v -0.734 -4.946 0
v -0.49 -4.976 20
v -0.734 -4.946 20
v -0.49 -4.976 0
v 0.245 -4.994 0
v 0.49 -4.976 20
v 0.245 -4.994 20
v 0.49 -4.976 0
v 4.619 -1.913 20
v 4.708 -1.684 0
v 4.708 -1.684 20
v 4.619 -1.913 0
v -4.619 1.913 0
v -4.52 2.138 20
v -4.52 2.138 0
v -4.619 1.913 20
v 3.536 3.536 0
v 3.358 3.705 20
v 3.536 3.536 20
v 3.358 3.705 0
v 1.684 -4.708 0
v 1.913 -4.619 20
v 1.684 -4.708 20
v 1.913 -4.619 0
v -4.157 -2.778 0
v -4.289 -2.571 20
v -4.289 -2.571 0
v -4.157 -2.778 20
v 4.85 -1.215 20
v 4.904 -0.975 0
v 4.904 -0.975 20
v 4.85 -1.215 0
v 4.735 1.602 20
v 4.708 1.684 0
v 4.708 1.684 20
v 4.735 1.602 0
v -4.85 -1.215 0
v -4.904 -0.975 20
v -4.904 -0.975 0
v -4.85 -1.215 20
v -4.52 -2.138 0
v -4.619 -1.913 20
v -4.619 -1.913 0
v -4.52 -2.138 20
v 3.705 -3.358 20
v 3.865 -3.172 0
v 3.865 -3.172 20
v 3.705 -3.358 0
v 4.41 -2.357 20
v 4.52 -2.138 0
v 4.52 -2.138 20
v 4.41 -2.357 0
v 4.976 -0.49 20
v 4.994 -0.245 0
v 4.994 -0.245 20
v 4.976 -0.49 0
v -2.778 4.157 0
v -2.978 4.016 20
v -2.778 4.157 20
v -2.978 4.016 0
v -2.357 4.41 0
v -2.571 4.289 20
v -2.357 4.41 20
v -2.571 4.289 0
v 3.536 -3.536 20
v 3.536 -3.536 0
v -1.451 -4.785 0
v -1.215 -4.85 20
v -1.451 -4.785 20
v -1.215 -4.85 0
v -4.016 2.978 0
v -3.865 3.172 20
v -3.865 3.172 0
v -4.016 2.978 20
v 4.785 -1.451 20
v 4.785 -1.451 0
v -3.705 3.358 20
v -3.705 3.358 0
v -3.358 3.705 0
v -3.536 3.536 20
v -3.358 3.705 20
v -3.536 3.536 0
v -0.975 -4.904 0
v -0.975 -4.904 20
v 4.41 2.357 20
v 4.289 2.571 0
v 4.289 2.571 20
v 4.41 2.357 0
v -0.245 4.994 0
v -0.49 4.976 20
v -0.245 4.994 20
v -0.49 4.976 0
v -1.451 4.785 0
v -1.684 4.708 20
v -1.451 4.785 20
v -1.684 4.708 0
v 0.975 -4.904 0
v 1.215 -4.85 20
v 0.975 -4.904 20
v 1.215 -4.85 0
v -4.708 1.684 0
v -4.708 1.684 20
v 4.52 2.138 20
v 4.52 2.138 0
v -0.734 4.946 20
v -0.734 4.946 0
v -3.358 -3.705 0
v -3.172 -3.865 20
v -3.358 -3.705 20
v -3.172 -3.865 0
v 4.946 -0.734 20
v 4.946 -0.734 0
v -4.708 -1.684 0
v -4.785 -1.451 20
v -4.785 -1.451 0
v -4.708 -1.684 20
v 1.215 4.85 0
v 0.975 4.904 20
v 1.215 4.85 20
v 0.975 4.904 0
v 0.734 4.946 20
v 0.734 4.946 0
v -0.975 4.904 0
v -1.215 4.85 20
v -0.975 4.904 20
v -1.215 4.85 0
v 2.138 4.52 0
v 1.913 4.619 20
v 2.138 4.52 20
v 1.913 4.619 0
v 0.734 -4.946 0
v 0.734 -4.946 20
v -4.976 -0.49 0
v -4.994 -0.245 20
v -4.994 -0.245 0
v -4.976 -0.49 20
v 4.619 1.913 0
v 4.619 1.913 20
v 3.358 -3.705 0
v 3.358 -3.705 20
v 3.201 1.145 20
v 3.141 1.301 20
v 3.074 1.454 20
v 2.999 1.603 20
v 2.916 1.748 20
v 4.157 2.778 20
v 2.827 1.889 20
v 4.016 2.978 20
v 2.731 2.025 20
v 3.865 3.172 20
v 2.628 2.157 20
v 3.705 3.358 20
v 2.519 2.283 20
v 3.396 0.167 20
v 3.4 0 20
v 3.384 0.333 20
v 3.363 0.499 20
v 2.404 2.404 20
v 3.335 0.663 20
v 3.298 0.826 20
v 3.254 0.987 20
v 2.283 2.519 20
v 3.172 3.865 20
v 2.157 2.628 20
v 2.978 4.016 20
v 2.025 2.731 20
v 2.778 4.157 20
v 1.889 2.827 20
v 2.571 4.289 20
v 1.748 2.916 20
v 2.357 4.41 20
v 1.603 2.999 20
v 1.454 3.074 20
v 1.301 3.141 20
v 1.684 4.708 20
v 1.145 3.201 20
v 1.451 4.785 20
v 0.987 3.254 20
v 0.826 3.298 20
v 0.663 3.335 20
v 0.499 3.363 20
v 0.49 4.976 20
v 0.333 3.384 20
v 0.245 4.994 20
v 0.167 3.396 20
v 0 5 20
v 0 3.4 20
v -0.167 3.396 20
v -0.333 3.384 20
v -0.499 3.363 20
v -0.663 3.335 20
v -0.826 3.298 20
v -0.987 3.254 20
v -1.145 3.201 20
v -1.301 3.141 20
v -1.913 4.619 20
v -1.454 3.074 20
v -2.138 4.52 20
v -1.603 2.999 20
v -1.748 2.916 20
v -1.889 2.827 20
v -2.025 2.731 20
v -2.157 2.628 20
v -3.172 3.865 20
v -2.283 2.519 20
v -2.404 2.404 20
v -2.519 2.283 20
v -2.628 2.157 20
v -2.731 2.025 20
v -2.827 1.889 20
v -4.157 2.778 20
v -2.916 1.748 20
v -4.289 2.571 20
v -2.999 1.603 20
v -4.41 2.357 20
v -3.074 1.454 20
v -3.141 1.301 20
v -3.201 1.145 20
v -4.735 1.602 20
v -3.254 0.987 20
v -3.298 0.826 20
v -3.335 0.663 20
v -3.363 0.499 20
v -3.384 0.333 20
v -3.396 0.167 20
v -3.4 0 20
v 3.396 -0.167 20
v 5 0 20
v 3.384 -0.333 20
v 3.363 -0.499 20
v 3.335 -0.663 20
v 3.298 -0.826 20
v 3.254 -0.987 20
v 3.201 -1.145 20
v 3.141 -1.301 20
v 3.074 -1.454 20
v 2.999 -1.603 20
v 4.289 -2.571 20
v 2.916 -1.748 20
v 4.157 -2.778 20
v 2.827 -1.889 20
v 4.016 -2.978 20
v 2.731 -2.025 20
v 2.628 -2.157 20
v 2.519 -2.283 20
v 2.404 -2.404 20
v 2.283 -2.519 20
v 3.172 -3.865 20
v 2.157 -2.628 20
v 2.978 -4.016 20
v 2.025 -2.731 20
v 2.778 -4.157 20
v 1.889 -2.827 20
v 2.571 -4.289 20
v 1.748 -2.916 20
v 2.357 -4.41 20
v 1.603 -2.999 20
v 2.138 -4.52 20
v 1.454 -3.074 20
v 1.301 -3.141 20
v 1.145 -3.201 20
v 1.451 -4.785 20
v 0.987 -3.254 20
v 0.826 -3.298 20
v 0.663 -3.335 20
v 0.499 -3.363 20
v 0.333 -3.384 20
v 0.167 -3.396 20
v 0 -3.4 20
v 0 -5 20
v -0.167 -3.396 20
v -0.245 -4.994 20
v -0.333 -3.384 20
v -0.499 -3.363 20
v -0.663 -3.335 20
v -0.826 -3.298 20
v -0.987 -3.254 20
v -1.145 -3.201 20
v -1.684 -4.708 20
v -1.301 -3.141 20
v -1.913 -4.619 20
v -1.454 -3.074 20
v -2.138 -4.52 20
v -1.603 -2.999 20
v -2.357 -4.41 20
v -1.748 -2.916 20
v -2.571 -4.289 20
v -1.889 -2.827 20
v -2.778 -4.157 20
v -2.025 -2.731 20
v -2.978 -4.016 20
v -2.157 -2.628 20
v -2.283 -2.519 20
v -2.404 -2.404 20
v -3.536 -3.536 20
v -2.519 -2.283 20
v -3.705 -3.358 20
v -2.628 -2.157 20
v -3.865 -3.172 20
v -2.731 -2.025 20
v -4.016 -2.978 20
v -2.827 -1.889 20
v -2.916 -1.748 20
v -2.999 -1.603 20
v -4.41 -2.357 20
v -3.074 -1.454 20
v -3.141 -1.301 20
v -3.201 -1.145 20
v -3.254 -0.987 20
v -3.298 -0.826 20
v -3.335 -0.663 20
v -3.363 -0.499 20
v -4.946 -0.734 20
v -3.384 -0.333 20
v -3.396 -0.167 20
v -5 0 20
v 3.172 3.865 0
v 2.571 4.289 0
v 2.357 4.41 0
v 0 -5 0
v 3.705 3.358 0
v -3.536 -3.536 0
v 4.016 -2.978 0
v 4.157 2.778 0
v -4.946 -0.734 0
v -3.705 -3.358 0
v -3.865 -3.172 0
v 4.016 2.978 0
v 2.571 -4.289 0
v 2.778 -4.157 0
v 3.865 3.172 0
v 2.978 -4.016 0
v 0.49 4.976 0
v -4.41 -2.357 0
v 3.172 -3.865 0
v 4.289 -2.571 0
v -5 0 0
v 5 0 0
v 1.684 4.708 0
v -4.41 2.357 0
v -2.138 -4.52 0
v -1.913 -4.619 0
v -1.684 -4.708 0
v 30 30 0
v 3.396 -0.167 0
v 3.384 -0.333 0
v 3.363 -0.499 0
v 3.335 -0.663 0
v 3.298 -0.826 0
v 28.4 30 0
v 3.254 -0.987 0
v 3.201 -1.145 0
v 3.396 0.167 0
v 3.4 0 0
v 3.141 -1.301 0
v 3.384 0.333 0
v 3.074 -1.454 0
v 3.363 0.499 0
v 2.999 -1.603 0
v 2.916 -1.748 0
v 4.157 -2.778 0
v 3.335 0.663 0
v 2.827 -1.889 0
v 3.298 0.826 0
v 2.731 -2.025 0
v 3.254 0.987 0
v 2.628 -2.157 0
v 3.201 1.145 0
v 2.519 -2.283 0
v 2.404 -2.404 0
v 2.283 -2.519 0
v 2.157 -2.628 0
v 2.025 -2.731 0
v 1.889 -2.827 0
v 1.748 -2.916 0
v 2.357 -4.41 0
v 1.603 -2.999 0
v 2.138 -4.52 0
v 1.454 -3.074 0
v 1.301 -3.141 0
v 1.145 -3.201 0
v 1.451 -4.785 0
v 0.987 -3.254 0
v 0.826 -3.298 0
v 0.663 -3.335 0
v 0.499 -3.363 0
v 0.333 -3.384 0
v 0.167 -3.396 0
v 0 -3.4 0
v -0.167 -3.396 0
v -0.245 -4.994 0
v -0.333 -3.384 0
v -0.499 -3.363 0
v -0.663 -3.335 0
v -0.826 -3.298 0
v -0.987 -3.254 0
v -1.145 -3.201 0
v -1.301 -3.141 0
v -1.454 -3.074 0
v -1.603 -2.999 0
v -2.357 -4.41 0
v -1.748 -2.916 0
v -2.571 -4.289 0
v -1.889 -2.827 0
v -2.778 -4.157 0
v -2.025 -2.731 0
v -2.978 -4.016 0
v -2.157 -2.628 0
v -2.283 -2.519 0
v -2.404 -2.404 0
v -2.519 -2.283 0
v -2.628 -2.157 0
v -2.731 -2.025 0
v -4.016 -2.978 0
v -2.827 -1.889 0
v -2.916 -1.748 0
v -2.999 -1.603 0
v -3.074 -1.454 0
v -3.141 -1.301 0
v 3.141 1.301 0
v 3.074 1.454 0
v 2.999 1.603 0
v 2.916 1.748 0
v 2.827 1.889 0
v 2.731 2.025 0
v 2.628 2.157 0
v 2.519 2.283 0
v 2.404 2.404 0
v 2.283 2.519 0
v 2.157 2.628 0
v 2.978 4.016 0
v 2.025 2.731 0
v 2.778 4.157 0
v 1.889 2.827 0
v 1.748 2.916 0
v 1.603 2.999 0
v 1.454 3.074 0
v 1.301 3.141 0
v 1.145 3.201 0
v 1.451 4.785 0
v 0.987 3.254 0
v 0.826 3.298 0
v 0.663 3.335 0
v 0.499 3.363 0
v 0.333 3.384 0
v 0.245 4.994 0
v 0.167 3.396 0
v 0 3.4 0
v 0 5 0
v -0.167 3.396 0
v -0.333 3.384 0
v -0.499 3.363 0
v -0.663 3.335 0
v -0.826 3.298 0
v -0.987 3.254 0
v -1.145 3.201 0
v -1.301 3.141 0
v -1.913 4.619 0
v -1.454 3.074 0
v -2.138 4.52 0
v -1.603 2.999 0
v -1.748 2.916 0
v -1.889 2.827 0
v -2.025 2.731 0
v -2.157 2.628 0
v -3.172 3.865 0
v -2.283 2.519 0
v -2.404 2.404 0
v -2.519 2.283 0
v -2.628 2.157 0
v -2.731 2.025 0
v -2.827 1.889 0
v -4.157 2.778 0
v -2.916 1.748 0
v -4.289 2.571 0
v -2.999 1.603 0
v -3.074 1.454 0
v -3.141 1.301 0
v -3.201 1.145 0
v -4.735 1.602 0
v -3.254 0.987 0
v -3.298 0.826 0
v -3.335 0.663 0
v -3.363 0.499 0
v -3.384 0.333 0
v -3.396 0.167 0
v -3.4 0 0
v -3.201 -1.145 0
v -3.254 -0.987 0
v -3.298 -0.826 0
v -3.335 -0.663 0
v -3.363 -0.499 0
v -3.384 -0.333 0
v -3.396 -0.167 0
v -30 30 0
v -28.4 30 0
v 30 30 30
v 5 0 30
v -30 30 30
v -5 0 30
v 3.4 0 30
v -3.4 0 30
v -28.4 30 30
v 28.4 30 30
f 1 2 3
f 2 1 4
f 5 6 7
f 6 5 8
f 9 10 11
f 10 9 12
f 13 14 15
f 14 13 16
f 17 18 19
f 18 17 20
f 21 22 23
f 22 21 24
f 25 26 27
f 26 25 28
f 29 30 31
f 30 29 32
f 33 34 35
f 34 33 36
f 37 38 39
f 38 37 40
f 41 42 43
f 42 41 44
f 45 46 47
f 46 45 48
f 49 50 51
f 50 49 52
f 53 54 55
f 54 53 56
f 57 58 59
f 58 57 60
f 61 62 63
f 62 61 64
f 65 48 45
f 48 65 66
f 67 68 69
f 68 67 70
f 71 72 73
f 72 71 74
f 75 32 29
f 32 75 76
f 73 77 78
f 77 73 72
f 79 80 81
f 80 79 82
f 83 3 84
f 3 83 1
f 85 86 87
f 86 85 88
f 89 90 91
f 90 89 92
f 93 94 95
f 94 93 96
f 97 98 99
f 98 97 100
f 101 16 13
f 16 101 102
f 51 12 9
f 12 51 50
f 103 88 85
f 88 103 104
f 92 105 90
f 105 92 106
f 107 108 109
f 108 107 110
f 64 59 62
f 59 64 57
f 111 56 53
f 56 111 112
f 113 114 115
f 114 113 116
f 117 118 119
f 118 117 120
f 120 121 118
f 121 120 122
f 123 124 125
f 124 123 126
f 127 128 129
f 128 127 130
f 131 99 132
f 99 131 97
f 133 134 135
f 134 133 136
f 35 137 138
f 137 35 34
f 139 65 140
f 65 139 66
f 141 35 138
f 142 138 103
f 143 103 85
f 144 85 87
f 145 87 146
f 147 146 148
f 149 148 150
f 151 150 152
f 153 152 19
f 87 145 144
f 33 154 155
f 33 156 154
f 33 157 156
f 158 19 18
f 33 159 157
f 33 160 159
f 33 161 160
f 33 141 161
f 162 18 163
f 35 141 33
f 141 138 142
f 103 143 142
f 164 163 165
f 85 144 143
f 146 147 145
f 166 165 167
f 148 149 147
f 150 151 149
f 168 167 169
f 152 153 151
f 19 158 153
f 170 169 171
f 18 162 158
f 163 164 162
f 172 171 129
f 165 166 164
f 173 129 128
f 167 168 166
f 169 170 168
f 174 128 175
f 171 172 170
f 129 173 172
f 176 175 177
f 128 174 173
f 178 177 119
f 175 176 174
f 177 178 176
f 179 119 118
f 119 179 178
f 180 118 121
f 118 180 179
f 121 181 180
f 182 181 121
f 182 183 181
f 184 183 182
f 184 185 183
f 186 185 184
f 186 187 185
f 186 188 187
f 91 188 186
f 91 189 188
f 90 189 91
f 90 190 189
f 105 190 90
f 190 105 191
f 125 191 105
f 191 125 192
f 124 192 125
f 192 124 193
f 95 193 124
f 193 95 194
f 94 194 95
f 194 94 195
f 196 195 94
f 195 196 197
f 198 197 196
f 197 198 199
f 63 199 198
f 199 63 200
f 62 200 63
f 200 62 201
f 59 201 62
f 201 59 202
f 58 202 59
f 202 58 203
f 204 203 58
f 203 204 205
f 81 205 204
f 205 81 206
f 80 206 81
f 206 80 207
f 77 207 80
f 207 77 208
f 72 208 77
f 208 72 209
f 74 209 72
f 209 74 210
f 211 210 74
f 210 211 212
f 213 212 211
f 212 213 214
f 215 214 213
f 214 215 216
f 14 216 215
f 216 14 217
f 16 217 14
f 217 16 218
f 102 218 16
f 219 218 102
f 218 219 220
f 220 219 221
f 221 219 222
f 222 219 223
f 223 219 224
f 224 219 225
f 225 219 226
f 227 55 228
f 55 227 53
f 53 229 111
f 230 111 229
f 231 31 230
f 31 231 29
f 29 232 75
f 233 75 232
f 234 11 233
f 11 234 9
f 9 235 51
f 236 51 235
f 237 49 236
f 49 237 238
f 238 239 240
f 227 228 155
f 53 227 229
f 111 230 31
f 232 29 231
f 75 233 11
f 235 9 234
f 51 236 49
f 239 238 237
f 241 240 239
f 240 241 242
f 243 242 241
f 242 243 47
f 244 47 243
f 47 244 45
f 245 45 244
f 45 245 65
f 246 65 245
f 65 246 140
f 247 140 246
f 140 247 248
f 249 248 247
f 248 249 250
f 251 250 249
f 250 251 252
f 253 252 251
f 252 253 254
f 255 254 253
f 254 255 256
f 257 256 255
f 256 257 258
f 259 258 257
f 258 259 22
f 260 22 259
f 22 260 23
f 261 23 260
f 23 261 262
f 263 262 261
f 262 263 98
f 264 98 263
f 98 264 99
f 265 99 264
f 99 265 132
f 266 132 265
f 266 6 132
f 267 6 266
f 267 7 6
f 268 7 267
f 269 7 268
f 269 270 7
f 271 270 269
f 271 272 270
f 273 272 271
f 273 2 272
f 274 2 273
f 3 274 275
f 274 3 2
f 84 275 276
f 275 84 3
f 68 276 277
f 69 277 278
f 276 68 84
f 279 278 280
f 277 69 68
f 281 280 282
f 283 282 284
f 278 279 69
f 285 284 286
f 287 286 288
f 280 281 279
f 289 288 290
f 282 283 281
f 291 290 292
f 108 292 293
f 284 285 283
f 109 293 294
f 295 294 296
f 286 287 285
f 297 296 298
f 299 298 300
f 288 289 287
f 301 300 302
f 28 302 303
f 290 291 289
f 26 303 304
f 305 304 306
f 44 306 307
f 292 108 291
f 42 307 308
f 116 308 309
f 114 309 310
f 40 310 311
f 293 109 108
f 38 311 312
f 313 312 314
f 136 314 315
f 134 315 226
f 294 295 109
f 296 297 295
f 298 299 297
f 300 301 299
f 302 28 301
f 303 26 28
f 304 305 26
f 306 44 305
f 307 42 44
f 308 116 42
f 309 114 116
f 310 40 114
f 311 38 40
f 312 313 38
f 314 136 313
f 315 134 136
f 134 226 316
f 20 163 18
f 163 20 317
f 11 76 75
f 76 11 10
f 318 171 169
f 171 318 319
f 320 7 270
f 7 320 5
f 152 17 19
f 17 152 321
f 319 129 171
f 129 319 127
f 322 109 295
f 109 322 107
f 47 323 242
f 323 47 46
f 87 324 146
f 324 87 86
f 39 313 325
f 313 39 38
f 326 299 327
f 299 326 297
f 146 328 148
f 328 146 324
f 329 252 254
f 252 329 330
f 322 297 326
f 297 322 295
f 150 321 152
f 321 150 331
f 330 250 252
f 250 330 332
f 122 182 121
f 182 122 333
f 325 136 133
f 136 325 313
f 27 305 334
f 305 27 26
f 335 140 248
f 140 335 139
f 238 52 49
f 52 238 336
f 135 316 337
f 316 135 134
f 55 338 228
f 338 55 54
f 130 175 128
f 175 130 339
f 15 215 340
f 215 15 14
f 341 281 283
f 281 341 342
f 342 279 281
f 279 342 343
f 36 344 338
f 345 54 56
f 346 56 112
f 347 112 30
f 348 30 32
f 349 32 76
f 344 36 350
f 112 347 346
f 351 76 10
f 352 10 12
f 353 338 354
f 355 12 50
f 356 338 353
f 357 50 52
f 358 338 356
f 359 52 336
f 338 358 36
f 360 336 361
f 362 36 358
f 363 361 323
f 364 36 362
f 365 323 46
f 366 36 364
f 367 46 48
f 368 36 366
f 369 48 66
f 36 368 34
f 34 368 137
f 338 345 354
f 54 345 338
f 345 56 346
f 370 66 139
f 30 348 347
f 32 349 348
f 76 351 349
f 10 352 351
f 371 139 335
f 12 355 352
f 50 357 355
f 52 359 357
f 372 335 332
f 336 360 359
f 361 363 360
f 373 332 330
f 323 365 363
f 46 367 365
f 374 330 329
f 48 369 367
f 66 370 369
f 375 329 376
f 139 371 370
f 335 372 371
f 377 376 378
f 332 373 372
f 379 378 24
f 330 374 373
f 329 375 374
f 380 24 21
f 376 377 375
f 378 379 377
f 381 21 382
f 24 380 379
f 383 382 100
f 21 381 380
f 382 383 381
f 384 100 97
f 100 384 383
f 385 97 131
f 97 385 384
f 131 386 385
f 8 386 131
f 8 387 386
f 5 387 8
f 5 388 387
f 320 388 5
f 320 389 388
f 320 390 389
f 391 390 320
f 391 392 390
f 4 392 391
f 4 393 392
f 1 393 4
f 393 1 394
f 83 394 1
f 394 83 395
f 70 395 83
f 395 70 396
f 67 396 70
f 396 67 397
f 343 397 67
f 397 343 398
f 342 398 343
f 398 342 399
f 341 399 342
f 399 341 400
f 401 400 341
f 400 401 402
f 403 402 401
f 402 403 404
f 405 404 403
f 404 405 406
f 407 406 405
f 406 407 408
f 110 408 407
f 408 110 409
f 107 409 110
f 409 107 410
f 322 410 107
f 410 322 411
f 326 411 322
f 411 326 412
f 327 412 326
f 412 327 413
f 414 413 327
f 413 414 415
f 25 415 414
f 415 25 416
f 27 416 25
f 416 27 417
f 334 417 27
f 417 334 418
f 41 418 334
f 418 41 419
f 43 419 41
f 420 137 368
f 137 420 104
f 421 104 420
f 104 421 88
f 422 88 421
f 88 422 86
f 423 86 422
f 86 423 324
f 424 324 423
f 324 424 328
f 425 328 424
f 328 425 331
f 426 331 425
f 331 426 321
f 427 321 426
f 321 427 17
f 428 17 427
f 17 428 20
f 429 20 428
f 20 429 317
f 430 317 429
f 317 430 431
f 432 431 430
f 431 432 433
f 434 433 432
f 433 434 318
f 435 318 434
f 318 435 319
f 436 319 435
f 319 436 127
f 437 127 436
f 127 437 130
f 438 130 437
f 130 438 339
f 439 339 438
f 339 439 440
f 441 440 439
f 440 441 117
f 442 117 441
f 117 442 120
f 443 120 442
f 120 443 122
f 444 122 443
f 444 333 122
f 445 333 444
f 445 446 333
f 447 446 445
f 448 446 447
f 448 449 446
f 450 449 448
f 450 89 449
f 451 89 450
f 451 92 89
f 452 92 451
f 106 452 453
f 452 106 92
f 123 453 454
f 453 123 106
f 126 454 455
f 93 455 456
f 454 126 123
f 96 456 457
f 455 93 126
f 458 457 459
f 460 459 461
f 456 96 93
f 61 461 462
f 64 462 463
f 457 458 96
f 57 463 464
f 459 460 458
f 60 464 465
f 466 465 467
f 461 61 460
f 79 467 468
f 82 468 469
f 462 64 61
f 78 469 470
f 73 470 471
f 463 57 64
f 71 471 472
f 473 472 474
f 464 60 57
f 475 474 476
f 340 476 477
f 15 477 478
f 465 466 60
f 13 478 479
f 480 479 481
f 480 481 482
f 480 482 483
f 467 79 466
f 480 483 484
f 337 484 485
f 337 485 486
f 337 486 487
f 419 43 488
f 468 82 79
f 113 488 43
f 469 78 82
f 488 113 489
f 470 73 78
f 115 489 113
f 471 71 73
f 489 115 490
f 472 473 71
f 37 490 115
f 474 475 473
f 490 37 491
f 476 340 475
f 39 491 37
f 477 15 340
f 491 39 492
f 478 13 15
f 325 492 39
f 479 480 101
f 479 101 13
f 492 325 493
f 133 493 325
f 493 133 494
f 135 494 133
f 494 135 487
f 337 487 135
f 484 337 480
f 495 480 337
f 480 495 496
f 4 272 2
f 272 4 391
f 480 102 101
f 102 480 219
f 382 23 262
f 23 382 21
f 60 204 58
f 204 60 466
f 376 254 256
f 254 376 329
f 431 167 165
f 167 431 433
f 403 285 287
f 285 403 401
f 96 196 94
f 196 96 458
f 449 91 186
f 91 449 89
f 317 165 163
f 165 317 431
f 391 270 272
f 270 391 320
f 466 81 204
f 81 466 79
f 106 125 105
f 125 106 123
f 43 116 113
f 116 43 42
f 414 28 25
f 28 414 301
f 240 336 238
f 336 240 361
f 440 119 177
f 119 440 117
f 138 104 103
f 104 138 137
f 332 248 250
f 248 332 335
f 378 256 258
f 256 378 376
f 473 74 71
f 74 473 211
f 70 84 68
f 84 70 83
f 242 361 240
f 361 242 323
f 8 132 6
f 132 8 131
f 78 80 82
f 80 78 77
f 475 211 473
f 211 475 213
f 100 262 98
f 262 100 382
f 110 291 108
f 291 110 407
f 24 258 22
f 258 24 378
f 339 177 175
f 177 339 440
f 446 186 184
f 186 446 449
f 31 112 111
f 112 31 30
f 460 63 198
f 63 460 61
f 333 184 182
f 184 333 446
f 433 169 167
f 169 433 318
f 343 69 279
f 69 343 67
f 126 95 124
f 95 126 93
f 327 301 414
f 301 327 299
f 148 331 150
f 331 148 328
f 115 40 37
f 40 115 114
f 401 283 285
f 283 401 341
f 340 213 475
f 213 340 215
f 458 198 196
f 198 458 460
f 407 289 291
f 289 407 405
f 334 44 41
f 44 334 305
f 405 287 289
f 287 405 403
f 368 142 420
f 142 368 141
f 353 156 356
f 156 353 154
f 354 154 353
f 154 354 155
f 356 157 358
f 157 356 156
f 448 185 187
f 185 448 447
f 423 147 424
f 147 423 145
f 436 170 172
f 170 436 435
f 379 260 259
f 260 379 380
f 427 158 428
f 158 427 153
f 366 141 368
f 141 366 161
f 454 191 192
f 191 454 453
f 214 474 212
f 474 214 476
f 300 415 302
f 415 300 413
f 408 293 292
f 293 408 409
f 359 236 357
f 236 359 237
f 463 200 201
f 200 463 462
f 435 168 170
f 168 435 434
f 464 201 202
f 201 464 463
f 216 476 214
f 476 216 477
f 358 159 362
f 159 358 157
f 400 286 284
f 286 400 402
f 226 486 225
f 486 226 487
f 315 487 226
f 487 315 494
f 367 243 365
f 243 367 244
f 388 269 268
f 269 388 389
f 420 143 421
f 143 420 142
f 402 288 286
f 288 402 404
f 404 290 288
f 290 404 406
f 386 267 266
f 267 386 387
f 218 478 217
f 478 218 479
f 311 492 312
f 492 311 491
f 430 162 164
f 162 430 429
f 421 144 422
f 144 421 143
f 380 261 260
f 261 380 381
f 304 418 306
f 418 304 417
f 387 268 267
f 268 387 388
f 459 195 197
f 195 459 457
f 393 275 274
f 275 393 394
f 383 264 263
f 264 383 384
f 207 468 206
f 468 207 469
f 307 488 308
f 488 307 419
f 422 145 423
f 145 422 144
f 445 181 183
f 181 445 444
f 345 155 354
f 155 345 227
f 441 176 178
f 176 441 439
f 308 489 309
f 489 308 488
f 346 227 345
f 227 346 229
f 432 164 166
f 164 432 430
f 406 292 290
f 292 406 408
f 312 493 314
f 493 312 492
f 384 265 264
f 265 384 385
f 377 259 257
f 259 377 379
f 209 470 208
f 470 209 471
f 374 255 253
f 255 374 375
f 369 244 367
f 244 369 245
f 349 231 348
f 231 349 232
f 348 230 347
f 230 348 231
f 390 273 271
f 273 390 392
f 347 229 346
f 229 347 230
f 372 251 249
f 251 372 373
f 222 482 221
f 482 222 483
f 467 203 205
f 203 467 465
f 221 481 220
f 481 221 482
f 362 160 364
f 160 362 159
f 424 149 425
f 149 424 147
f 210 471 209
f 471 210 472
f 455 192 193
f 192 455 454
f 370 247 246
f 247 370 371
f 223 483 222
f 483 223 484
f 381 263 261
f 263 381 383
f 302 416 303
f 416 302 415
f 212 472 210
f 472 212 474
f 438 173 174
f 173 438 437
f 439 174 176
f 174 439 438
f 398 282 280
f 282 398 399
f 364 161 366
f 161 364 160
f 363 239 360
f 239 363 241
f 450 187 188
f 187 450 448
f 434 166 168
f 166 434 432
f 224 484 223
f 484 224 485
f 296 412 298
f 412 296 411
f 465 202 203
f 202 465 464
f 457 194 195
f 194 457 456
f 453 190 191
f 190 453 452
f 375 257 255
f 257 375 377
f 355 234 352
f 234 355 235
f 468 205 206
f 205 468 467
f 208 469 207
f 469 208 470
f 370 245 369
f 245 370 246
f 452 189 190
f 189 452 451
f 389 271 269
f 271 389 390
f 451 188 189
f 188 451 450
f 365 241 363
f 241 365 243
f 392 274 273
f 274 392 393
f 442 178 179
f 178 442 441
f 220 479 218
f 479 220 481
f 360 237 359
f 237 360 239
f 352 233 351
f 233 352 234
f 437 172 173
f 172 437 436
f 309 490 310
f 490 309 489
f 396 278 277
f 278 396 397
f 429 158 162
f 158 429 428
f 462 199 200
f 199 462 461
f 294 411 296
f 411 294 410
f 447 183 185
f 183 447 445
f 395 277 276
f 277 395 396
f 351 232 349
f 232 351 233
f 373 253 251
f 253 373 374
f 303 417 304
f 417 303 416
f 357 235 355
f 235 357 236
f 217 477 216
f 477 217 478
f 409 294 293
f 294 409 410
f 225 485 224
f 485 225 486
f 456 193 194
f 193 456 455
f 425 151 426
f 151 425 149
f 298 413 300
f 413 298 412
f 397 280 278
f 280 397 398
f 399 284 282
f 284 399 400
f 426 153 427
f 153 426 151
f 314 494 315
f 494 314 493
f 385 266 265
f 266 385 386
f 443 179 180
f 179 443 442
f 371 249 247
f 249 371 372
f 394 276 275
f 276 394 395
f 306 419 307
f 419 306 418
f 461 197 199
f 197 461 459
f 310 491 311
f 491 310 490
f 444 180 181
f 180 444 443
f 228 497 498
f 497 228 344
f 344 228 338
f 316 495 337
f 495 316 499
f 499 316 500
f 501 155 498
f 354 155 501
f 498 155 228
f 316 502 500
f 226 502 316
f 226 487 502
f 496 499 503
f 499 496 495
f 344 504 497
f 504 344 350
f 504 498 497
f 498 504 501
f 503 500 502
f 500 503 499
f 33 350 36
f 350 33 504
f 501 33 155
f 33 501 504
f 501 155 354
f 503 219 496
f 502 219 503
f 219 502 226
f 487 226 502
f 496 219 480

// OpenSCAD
// Lab Funnel Design - Corrected
// Units: millimetres
// Orientation: Upright, wide opening at top, rests on XY plane at z=0.

// --- Dimensions ---
// Spout (Tube)
$spout_outer_diameter = 10;
$spout_inner_diameter = 6.8; // 10 - 2*1.6
$spout_length = 20;

// Cone (Funnel Body)
$cone_bottom_diameter = 10; // Matches spout outer diameter
$cone_top_diameter = 60;
$cone_height = 30; // From z=20 to z=50

// Wall Thickness
$wall_thickness = 1.6;

// Resolution for smooth curves
$fn = 128;

// --- Helper Functions ---

// Creates a hollow cylinder (tube)
// outer_d: outer diameter
// inner_d: inner diameter
// height: height of the cylinder
module hollow_cylinder(outer_d, inner_d, height) {
    difference() {
        cylinder(h = height, d = outer_d, center = false, $fn = $fn);
        cylinder(h = height, d = inner_d, center = false, $fn = $fn);
    }
}

// Creates a hollow cone (funnel shape) using linear_extrude
// bottom_d: diameter at the smaller end (z=0 relative to cone)
// top_d: diameter at the larger end (z=height relative to cone)
// height: height of the cone
module hollow_cone(bottom_d, top_d, height) {
    difference() {
        // Outer Cone
        linear_extrude(height = height, center = false, $fn = $fn) {
            polygon(points = [
                [-bottom_d/2, 0],
                [bottom_d/2, 0],
                [top_d/2, height],
                [-top_d/2, height]
            ]);
        }
        
        // Inner Cone (Bore)
        // Calculate inner diameters at bottom and top
        inner_bottom_d = bottom_d - 2 * $wall_thickness;
        inner_top_d = top_d - 2 * $wall_thickness;
        
        linear_extrude(height = height, center = false, $fn = $fn) {
            polygon(points = [
                [-inner_bottom_d/2, 0],
                [inner_bottom_d/2, 0],
                [inner_top_d/2, height],
                [-inner_top_d/2, height]
            ]);
        }
    }
}

// --- Main Assembly ---
// The part rests on the XY plane at z = 0.
// The spout runs from z = 0 to z = 20.
// The cone widens from z = 20 to z = 50.

translate([0, 0, 0]) {
    union() {
        // 1. The Spout (Tube)
        // Located from z=0 to z=20
        hollow_cylinder(
            outer_d = $spout_outer_diameter,
            inner_d = $spout_inner_diameter,
            height = $spout_length
        );
        
        // 2. The Cone (Funnel Body)
        // Located from z=20 to z=50
        // Bottom diameter matches spout outer diameter (10mm)
        // Top diameter is 60mm
        hollow_cone(
            bottom_d = $spout_outer_diameter,
            top_d = $cone_top_diameter,
            height = $cone_height
        );
    }
}
